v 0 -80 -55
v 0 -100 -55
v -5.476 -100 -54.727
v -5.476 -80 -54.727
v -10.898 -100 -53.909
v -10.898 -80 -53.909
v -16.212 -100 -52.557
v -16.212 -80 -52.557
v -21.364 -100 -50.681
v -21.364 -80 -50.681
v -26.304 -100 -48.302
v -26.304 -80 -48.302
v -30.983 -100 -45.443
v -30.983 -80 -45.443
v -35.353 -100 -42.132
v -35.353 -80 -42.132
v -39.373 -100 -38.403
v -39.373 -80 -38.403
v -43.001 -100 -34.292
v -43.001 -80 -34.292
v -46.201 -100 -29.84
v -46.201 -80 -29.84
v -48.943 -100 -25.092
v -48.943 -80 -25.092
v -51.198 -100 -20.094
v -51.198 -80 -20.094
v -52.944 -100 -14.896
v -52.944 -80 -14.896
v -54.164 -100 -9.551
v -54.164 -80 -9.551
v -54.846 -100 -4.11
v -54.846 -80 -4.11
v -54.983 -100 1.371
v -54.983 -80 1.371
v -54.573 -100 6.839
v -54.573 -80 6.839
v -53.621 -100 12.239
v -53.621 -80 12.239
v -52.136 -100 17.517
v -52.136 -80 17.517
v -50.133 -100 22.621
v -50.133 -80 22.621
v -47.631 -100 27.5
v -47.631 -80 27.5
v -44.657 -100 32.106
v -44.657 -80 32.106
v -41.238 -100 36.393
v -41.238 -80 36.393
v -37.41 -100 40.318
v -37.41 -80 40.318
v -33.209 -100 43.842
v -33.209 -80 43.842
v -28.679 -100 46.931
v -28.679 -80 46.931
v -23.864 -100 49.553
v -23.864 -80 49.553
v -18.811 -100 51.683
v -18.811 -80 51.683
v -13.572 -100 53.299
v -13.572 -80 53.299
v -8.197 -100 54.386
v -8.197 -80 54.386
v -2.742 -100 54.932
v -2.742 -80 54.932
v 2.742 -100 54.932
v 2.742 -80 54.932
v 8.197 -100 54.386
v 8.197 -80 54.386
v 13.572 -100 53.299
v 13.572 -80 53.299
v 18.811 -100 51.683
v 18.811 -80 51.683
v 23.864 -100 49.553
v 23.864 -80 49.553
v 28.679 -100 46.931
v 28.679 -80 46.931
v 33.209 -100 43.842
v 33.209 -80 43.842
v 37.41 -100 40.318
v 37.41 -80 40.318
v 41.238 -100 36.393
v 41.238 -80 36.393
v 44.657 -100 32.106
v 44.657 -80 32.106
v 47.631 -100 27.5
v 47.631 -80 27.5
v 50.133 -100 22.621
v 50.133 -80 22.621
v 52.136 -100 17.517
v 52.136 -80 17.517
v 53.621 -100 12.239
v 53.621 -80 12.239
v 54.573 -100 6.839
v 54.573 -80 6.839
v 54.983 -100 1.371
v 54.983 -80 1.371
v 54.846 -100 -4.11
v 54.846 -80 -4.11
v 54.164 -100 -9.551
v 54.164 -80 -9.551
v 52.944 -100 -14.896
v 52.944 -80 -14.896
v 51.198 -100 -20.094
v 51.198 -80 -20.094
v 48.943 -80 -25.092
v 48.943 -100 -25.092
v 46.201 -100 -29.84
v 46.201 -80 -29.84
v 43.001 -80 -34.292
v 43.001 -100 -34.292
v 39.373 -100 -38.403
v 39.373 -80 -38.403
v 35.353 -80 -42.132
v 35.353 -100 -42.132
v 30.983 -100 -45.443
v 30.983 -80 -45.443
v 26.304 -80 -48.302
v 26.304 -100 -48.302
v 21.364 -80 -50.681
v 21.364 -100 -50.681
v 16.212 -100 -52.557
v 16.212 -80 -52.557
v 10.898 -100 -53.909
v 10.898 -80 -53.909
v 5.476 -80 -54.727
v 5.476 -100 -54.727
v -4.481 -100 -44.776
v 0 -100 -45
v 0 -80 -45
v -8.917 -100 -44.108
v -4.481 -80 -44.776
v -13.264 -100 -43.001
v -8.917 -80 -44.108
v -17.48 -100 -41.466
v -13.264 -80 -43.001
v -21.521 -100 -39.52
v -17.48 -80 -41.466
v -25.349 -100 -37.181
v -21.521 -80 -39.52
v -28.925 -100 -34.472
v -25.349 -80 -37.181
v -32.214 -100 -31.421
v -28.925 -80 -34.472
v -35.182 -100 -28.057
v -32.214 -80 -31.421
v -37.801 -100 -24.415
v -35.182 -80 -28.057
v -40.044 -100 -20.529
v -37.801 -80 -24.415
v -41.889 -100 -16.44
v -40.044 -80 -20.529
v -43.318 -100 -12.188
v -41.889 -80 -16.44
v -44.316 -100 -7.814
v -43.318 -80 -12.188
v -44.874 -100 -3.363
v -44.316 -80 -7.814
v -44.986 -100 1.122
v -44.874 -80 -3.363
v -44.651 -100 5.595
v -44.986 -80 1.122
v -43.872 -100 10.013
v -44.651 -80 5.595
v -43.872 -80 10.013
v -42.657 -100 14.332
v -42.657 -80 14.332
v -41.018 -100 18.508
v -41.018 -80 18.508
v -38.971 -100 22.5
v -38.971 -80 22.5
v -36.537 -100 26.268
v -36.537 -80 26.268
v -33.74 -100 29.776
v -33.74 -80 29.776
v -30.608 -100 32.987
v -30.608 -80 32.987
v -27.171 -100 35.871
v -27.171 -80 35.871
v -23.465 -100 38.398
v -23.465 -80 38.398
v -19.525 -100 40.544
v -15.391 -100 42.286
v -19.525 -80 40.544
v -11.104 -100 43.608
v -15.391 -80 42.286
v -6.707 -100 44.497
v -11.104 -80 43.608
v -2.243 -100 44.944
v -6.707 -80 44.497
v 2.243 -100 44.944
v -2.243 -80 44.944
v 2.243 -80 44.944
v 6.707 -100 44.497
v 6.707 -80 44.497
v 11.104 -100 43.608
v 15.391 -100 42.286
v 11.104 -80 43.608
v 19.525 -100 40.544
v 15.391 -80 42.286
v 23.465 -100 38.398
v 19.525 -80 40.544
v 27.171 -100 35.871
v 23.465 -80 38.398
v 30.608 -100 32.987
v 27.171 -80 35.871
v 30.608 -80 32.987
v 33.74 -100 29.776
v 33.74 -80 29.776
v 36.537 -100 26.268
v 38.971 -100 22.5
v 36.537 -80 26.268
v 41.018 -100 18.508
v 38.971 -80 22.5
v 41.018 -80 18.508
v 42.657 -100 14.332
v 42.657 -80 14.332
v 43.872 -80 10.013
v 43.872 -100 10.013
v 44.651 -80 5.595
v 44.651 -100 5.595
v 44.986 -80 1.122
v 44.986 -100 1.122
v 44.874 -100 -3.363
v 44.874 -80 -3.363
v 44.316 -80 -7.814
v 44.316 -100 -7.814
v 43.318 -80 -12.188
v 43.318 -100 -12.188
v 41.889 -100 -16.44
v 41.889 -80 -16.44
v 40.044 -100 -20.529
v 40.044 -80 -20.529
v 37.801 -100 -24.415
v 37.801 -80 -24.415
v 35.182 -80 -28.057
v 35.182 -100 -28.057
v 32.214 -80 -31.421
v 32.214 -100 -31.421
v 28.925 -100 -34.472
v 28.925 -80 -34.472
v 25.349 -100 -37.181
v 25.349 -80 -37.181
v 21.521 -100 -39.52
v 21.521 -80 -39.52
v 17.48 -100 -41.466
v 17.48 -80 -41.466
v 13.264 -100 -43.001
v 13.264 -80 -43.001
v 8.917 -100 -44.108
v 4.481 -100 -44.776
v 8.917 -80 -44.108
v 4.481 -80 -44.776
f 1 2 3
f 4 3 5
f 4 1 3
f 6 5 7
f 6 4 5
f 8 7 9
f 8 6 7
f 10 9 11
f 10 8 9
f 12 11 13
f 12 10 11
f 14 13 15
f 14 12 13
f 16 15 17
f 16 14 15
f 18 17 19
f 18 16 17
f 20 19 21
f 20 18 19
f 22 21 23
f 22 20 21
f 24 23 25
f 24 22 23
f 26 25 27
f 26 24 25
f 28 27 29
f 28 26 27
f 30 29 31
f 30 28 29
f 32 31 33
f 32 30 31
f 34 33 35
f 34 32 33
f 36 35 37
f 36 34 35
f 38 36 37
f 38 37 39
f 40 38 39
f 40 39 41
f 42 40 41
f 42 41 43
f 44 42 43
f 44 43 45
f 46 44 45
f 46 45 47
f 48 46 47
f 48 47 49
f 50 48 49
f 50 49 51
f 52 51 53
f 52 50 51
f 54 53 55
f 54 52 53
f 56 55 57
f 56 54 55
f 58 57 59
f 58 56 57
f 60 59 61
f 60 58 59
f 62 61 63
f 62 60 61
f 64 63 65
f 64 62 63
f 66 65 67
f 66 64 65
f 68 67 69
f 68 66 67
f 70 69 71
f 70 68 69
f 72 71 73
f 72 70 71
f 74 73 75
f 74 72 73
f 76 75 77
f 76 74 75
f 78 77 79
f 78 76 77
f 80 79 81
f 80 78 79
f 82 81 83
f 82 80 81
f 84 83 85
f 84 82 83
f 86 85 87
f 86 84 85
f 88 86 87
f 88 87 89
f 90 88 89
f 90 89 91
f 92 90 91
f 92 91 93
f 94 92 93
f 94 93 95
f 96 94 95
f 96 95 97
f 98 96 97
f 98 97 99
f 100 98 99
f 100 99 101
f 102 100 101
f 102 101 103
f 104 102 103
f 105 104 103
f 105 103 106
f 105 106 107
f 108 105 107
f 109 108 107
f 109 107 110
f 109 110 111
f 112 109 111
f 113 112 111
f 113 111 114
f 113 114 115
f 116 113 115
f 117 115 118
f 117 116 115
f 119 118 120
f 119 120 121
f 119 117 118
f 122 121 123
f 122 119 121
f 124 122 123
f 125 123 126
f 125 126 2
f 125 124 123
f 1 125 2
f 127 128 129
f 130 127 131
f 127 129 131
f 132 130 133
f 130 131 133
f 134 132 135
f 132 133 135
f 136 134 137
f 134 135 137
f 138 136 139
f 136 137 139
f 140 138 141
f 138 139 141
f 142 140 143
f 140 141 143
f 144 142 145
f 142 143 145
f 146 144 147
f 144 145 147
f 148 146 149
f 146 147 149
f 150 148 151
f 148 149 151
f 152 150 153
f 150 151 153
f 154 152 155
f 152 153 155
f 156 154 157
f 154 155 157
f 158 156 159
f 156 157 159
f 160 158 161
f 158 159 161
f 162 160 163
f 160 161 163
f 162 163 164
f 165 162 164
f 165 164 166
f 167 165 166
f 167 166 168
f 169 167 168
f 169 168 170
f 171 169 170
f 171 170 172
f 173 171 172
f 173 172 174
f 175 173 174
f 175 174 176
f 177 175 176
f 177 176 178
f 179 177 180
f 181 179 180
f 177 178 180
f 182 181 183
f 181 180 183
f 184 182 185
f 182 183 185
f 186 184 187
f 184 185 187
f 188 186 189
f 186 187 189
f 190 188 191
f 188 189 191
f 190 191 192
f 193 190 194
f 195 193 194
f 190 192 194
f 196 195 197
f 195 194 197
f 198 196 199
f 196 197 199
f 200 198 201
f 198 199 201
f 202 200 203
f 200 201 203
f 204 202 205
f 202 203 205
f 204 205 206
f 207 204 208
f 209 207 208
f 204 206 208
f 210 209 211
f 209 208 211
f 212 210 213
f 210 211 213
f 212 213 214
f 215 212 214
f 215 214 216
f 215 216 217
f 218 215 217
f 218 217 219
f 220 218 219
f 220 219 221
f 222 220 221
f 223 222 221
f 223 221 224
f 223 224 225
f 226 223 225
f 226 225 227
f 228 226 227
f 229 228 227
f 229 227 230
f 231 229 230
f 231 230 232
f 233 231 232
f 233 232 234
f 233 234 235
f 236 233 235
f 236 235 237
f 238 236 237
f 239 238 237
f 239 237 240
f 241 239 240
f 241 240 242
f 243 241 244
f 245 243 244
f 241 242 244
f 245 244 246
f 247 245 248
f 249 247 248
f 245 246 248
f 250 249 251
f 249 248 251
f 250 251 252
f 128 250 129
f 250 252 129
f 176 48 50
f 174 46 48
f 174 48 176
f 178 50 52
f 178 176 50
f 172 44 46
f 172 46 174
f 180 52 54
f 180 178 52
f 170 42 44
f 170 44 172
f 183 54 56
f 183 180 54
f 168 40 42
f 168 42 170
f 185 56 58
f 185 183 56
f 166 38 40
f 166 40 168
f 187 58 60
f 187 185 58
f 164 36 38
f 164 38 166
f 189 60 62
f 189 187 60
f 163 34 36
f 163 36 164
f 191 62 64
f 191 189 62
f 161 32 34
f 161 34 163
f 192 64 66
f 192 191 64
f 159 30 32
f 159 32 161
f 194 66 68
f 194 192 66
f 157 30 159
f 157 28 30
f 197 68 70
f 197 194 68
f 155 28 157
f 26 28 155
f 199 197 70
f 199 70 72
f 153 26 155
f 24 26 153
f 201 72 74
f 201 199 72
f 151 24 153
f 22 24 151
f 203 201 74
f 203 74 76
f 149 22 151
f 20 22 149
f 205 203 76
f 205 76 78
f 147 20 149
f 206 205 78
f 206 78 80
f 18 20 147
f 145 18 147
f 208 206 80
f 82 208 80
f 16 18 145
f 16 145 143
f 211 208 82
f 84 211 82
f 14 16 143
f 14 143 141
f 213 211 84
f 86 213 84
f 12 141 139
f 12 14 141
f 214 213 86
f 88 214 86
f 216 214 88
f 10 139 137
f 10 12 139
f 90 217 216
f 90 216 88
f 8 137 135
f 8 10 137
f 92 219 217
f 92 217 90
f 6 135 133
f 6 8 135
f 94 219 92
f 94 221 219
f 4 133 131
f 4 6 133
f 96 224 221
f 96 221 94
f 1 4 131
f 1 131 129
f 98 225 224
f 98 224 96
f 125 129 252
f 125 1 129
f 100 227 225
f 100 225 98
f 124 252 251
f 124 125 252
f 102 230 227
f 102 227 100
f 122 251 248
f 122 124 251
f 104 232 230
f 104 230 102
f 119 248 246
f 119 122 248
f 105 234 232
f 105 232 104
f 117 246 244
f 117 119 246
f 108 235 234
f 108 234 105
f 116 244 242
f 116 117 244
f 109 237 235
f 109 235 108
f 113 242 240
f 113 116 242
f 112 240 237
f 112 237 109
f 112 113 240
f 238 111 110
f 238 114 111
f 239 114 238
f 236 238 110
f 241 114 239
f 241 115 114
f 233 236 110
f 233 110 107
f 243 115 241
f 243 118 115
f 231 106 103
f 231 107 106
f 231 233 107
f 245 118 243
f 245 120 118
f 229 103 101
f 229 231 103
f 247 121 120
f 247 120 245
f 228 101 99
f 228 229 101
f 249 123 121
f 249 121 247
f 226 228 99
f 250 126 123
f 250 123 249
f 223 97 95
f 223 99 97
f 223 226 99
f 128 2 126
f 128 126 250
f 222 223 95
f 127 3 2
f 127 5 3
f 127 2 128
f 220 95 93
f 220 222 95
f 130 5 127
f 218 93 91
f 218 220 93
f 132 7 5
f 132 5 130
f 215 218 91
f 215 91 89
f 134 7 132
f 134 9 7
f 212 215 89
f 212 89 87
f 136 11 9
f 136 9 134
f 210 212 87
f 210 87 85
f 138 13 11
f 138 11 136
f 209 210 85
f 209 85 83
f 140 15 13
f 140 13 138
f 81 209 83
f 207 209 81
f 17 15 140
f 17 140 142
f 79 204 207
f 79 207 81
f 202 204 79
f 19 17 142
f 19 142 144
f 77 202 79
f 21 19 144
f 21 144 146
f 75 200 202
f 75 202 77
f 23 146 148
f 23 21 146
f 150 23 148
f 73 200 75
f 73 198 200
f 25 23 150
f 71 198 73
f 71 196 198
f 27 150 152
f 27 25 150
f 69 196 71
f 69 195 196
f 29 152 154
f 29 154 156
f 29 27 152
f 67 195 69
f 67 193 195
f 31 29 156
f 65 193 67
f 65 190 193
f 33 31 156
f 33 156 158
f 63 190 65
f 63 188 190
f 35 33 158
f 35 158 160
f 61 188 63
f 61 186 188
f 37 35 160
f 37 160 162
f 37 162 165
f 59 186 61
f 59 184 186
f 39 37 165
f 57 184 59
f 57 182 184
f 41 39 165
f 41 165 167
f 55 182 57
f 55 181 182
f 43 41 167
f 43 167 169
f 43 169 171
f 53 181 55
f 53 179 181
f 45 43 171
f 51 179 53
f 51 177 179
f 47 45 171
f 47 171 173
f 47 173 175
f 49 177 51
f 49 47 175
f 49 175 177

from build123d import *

# Parameters (mm, degrees)
SKETCH_1_W                = 10
SKETCH_1_H                = 200
SURFACE_START             = -80
SURFACE_CUT_1_OUTLINE_R   = 55
SURFACE_CUT_1_OUTLINE_R_2 = 45
SURFACE_CUT_1_DEPTH       = 180


# Read off the part's stored shape, not the designer's step: Сечение1
with BuildPart() as part:
    # Эскиз1 → Повернуть1 (revolve)
    with BuildSketch(Plane.XY, mode=Mode.PRIVATE) as revolve_1_sk:
        with Locations((50, 0)):
            Rectangle(SKETCH_1_W, SKETCH_1_H)
    revolve(revolve_1_sk.sketch.rotate(Axis((0, -110.603092707, 0), (0, 1, 0)), 90), axis=Axis((0, -110.603092707, 0), (0, 1, 0)))

    # Surface Cut 1 outline → Surface Cut 1 (cut)
    with BuildSketch(Plane(origin=(0, 0, 0), x_dir=(1, 0, 0), z_dir=(0, 1, 0)).offset(SURFACE_START)):
        Circle(SURFACE_CUT_1_OUTLINE_R)
        Circle(SURFACE_CUT_1_OUTLINE_R_2, mode=Mode.SUBTRACT)
    extrude(amount=SURFACE_CUT_1_DEPTH, mode=Mode.SUBTRACT)


solid = part.part
